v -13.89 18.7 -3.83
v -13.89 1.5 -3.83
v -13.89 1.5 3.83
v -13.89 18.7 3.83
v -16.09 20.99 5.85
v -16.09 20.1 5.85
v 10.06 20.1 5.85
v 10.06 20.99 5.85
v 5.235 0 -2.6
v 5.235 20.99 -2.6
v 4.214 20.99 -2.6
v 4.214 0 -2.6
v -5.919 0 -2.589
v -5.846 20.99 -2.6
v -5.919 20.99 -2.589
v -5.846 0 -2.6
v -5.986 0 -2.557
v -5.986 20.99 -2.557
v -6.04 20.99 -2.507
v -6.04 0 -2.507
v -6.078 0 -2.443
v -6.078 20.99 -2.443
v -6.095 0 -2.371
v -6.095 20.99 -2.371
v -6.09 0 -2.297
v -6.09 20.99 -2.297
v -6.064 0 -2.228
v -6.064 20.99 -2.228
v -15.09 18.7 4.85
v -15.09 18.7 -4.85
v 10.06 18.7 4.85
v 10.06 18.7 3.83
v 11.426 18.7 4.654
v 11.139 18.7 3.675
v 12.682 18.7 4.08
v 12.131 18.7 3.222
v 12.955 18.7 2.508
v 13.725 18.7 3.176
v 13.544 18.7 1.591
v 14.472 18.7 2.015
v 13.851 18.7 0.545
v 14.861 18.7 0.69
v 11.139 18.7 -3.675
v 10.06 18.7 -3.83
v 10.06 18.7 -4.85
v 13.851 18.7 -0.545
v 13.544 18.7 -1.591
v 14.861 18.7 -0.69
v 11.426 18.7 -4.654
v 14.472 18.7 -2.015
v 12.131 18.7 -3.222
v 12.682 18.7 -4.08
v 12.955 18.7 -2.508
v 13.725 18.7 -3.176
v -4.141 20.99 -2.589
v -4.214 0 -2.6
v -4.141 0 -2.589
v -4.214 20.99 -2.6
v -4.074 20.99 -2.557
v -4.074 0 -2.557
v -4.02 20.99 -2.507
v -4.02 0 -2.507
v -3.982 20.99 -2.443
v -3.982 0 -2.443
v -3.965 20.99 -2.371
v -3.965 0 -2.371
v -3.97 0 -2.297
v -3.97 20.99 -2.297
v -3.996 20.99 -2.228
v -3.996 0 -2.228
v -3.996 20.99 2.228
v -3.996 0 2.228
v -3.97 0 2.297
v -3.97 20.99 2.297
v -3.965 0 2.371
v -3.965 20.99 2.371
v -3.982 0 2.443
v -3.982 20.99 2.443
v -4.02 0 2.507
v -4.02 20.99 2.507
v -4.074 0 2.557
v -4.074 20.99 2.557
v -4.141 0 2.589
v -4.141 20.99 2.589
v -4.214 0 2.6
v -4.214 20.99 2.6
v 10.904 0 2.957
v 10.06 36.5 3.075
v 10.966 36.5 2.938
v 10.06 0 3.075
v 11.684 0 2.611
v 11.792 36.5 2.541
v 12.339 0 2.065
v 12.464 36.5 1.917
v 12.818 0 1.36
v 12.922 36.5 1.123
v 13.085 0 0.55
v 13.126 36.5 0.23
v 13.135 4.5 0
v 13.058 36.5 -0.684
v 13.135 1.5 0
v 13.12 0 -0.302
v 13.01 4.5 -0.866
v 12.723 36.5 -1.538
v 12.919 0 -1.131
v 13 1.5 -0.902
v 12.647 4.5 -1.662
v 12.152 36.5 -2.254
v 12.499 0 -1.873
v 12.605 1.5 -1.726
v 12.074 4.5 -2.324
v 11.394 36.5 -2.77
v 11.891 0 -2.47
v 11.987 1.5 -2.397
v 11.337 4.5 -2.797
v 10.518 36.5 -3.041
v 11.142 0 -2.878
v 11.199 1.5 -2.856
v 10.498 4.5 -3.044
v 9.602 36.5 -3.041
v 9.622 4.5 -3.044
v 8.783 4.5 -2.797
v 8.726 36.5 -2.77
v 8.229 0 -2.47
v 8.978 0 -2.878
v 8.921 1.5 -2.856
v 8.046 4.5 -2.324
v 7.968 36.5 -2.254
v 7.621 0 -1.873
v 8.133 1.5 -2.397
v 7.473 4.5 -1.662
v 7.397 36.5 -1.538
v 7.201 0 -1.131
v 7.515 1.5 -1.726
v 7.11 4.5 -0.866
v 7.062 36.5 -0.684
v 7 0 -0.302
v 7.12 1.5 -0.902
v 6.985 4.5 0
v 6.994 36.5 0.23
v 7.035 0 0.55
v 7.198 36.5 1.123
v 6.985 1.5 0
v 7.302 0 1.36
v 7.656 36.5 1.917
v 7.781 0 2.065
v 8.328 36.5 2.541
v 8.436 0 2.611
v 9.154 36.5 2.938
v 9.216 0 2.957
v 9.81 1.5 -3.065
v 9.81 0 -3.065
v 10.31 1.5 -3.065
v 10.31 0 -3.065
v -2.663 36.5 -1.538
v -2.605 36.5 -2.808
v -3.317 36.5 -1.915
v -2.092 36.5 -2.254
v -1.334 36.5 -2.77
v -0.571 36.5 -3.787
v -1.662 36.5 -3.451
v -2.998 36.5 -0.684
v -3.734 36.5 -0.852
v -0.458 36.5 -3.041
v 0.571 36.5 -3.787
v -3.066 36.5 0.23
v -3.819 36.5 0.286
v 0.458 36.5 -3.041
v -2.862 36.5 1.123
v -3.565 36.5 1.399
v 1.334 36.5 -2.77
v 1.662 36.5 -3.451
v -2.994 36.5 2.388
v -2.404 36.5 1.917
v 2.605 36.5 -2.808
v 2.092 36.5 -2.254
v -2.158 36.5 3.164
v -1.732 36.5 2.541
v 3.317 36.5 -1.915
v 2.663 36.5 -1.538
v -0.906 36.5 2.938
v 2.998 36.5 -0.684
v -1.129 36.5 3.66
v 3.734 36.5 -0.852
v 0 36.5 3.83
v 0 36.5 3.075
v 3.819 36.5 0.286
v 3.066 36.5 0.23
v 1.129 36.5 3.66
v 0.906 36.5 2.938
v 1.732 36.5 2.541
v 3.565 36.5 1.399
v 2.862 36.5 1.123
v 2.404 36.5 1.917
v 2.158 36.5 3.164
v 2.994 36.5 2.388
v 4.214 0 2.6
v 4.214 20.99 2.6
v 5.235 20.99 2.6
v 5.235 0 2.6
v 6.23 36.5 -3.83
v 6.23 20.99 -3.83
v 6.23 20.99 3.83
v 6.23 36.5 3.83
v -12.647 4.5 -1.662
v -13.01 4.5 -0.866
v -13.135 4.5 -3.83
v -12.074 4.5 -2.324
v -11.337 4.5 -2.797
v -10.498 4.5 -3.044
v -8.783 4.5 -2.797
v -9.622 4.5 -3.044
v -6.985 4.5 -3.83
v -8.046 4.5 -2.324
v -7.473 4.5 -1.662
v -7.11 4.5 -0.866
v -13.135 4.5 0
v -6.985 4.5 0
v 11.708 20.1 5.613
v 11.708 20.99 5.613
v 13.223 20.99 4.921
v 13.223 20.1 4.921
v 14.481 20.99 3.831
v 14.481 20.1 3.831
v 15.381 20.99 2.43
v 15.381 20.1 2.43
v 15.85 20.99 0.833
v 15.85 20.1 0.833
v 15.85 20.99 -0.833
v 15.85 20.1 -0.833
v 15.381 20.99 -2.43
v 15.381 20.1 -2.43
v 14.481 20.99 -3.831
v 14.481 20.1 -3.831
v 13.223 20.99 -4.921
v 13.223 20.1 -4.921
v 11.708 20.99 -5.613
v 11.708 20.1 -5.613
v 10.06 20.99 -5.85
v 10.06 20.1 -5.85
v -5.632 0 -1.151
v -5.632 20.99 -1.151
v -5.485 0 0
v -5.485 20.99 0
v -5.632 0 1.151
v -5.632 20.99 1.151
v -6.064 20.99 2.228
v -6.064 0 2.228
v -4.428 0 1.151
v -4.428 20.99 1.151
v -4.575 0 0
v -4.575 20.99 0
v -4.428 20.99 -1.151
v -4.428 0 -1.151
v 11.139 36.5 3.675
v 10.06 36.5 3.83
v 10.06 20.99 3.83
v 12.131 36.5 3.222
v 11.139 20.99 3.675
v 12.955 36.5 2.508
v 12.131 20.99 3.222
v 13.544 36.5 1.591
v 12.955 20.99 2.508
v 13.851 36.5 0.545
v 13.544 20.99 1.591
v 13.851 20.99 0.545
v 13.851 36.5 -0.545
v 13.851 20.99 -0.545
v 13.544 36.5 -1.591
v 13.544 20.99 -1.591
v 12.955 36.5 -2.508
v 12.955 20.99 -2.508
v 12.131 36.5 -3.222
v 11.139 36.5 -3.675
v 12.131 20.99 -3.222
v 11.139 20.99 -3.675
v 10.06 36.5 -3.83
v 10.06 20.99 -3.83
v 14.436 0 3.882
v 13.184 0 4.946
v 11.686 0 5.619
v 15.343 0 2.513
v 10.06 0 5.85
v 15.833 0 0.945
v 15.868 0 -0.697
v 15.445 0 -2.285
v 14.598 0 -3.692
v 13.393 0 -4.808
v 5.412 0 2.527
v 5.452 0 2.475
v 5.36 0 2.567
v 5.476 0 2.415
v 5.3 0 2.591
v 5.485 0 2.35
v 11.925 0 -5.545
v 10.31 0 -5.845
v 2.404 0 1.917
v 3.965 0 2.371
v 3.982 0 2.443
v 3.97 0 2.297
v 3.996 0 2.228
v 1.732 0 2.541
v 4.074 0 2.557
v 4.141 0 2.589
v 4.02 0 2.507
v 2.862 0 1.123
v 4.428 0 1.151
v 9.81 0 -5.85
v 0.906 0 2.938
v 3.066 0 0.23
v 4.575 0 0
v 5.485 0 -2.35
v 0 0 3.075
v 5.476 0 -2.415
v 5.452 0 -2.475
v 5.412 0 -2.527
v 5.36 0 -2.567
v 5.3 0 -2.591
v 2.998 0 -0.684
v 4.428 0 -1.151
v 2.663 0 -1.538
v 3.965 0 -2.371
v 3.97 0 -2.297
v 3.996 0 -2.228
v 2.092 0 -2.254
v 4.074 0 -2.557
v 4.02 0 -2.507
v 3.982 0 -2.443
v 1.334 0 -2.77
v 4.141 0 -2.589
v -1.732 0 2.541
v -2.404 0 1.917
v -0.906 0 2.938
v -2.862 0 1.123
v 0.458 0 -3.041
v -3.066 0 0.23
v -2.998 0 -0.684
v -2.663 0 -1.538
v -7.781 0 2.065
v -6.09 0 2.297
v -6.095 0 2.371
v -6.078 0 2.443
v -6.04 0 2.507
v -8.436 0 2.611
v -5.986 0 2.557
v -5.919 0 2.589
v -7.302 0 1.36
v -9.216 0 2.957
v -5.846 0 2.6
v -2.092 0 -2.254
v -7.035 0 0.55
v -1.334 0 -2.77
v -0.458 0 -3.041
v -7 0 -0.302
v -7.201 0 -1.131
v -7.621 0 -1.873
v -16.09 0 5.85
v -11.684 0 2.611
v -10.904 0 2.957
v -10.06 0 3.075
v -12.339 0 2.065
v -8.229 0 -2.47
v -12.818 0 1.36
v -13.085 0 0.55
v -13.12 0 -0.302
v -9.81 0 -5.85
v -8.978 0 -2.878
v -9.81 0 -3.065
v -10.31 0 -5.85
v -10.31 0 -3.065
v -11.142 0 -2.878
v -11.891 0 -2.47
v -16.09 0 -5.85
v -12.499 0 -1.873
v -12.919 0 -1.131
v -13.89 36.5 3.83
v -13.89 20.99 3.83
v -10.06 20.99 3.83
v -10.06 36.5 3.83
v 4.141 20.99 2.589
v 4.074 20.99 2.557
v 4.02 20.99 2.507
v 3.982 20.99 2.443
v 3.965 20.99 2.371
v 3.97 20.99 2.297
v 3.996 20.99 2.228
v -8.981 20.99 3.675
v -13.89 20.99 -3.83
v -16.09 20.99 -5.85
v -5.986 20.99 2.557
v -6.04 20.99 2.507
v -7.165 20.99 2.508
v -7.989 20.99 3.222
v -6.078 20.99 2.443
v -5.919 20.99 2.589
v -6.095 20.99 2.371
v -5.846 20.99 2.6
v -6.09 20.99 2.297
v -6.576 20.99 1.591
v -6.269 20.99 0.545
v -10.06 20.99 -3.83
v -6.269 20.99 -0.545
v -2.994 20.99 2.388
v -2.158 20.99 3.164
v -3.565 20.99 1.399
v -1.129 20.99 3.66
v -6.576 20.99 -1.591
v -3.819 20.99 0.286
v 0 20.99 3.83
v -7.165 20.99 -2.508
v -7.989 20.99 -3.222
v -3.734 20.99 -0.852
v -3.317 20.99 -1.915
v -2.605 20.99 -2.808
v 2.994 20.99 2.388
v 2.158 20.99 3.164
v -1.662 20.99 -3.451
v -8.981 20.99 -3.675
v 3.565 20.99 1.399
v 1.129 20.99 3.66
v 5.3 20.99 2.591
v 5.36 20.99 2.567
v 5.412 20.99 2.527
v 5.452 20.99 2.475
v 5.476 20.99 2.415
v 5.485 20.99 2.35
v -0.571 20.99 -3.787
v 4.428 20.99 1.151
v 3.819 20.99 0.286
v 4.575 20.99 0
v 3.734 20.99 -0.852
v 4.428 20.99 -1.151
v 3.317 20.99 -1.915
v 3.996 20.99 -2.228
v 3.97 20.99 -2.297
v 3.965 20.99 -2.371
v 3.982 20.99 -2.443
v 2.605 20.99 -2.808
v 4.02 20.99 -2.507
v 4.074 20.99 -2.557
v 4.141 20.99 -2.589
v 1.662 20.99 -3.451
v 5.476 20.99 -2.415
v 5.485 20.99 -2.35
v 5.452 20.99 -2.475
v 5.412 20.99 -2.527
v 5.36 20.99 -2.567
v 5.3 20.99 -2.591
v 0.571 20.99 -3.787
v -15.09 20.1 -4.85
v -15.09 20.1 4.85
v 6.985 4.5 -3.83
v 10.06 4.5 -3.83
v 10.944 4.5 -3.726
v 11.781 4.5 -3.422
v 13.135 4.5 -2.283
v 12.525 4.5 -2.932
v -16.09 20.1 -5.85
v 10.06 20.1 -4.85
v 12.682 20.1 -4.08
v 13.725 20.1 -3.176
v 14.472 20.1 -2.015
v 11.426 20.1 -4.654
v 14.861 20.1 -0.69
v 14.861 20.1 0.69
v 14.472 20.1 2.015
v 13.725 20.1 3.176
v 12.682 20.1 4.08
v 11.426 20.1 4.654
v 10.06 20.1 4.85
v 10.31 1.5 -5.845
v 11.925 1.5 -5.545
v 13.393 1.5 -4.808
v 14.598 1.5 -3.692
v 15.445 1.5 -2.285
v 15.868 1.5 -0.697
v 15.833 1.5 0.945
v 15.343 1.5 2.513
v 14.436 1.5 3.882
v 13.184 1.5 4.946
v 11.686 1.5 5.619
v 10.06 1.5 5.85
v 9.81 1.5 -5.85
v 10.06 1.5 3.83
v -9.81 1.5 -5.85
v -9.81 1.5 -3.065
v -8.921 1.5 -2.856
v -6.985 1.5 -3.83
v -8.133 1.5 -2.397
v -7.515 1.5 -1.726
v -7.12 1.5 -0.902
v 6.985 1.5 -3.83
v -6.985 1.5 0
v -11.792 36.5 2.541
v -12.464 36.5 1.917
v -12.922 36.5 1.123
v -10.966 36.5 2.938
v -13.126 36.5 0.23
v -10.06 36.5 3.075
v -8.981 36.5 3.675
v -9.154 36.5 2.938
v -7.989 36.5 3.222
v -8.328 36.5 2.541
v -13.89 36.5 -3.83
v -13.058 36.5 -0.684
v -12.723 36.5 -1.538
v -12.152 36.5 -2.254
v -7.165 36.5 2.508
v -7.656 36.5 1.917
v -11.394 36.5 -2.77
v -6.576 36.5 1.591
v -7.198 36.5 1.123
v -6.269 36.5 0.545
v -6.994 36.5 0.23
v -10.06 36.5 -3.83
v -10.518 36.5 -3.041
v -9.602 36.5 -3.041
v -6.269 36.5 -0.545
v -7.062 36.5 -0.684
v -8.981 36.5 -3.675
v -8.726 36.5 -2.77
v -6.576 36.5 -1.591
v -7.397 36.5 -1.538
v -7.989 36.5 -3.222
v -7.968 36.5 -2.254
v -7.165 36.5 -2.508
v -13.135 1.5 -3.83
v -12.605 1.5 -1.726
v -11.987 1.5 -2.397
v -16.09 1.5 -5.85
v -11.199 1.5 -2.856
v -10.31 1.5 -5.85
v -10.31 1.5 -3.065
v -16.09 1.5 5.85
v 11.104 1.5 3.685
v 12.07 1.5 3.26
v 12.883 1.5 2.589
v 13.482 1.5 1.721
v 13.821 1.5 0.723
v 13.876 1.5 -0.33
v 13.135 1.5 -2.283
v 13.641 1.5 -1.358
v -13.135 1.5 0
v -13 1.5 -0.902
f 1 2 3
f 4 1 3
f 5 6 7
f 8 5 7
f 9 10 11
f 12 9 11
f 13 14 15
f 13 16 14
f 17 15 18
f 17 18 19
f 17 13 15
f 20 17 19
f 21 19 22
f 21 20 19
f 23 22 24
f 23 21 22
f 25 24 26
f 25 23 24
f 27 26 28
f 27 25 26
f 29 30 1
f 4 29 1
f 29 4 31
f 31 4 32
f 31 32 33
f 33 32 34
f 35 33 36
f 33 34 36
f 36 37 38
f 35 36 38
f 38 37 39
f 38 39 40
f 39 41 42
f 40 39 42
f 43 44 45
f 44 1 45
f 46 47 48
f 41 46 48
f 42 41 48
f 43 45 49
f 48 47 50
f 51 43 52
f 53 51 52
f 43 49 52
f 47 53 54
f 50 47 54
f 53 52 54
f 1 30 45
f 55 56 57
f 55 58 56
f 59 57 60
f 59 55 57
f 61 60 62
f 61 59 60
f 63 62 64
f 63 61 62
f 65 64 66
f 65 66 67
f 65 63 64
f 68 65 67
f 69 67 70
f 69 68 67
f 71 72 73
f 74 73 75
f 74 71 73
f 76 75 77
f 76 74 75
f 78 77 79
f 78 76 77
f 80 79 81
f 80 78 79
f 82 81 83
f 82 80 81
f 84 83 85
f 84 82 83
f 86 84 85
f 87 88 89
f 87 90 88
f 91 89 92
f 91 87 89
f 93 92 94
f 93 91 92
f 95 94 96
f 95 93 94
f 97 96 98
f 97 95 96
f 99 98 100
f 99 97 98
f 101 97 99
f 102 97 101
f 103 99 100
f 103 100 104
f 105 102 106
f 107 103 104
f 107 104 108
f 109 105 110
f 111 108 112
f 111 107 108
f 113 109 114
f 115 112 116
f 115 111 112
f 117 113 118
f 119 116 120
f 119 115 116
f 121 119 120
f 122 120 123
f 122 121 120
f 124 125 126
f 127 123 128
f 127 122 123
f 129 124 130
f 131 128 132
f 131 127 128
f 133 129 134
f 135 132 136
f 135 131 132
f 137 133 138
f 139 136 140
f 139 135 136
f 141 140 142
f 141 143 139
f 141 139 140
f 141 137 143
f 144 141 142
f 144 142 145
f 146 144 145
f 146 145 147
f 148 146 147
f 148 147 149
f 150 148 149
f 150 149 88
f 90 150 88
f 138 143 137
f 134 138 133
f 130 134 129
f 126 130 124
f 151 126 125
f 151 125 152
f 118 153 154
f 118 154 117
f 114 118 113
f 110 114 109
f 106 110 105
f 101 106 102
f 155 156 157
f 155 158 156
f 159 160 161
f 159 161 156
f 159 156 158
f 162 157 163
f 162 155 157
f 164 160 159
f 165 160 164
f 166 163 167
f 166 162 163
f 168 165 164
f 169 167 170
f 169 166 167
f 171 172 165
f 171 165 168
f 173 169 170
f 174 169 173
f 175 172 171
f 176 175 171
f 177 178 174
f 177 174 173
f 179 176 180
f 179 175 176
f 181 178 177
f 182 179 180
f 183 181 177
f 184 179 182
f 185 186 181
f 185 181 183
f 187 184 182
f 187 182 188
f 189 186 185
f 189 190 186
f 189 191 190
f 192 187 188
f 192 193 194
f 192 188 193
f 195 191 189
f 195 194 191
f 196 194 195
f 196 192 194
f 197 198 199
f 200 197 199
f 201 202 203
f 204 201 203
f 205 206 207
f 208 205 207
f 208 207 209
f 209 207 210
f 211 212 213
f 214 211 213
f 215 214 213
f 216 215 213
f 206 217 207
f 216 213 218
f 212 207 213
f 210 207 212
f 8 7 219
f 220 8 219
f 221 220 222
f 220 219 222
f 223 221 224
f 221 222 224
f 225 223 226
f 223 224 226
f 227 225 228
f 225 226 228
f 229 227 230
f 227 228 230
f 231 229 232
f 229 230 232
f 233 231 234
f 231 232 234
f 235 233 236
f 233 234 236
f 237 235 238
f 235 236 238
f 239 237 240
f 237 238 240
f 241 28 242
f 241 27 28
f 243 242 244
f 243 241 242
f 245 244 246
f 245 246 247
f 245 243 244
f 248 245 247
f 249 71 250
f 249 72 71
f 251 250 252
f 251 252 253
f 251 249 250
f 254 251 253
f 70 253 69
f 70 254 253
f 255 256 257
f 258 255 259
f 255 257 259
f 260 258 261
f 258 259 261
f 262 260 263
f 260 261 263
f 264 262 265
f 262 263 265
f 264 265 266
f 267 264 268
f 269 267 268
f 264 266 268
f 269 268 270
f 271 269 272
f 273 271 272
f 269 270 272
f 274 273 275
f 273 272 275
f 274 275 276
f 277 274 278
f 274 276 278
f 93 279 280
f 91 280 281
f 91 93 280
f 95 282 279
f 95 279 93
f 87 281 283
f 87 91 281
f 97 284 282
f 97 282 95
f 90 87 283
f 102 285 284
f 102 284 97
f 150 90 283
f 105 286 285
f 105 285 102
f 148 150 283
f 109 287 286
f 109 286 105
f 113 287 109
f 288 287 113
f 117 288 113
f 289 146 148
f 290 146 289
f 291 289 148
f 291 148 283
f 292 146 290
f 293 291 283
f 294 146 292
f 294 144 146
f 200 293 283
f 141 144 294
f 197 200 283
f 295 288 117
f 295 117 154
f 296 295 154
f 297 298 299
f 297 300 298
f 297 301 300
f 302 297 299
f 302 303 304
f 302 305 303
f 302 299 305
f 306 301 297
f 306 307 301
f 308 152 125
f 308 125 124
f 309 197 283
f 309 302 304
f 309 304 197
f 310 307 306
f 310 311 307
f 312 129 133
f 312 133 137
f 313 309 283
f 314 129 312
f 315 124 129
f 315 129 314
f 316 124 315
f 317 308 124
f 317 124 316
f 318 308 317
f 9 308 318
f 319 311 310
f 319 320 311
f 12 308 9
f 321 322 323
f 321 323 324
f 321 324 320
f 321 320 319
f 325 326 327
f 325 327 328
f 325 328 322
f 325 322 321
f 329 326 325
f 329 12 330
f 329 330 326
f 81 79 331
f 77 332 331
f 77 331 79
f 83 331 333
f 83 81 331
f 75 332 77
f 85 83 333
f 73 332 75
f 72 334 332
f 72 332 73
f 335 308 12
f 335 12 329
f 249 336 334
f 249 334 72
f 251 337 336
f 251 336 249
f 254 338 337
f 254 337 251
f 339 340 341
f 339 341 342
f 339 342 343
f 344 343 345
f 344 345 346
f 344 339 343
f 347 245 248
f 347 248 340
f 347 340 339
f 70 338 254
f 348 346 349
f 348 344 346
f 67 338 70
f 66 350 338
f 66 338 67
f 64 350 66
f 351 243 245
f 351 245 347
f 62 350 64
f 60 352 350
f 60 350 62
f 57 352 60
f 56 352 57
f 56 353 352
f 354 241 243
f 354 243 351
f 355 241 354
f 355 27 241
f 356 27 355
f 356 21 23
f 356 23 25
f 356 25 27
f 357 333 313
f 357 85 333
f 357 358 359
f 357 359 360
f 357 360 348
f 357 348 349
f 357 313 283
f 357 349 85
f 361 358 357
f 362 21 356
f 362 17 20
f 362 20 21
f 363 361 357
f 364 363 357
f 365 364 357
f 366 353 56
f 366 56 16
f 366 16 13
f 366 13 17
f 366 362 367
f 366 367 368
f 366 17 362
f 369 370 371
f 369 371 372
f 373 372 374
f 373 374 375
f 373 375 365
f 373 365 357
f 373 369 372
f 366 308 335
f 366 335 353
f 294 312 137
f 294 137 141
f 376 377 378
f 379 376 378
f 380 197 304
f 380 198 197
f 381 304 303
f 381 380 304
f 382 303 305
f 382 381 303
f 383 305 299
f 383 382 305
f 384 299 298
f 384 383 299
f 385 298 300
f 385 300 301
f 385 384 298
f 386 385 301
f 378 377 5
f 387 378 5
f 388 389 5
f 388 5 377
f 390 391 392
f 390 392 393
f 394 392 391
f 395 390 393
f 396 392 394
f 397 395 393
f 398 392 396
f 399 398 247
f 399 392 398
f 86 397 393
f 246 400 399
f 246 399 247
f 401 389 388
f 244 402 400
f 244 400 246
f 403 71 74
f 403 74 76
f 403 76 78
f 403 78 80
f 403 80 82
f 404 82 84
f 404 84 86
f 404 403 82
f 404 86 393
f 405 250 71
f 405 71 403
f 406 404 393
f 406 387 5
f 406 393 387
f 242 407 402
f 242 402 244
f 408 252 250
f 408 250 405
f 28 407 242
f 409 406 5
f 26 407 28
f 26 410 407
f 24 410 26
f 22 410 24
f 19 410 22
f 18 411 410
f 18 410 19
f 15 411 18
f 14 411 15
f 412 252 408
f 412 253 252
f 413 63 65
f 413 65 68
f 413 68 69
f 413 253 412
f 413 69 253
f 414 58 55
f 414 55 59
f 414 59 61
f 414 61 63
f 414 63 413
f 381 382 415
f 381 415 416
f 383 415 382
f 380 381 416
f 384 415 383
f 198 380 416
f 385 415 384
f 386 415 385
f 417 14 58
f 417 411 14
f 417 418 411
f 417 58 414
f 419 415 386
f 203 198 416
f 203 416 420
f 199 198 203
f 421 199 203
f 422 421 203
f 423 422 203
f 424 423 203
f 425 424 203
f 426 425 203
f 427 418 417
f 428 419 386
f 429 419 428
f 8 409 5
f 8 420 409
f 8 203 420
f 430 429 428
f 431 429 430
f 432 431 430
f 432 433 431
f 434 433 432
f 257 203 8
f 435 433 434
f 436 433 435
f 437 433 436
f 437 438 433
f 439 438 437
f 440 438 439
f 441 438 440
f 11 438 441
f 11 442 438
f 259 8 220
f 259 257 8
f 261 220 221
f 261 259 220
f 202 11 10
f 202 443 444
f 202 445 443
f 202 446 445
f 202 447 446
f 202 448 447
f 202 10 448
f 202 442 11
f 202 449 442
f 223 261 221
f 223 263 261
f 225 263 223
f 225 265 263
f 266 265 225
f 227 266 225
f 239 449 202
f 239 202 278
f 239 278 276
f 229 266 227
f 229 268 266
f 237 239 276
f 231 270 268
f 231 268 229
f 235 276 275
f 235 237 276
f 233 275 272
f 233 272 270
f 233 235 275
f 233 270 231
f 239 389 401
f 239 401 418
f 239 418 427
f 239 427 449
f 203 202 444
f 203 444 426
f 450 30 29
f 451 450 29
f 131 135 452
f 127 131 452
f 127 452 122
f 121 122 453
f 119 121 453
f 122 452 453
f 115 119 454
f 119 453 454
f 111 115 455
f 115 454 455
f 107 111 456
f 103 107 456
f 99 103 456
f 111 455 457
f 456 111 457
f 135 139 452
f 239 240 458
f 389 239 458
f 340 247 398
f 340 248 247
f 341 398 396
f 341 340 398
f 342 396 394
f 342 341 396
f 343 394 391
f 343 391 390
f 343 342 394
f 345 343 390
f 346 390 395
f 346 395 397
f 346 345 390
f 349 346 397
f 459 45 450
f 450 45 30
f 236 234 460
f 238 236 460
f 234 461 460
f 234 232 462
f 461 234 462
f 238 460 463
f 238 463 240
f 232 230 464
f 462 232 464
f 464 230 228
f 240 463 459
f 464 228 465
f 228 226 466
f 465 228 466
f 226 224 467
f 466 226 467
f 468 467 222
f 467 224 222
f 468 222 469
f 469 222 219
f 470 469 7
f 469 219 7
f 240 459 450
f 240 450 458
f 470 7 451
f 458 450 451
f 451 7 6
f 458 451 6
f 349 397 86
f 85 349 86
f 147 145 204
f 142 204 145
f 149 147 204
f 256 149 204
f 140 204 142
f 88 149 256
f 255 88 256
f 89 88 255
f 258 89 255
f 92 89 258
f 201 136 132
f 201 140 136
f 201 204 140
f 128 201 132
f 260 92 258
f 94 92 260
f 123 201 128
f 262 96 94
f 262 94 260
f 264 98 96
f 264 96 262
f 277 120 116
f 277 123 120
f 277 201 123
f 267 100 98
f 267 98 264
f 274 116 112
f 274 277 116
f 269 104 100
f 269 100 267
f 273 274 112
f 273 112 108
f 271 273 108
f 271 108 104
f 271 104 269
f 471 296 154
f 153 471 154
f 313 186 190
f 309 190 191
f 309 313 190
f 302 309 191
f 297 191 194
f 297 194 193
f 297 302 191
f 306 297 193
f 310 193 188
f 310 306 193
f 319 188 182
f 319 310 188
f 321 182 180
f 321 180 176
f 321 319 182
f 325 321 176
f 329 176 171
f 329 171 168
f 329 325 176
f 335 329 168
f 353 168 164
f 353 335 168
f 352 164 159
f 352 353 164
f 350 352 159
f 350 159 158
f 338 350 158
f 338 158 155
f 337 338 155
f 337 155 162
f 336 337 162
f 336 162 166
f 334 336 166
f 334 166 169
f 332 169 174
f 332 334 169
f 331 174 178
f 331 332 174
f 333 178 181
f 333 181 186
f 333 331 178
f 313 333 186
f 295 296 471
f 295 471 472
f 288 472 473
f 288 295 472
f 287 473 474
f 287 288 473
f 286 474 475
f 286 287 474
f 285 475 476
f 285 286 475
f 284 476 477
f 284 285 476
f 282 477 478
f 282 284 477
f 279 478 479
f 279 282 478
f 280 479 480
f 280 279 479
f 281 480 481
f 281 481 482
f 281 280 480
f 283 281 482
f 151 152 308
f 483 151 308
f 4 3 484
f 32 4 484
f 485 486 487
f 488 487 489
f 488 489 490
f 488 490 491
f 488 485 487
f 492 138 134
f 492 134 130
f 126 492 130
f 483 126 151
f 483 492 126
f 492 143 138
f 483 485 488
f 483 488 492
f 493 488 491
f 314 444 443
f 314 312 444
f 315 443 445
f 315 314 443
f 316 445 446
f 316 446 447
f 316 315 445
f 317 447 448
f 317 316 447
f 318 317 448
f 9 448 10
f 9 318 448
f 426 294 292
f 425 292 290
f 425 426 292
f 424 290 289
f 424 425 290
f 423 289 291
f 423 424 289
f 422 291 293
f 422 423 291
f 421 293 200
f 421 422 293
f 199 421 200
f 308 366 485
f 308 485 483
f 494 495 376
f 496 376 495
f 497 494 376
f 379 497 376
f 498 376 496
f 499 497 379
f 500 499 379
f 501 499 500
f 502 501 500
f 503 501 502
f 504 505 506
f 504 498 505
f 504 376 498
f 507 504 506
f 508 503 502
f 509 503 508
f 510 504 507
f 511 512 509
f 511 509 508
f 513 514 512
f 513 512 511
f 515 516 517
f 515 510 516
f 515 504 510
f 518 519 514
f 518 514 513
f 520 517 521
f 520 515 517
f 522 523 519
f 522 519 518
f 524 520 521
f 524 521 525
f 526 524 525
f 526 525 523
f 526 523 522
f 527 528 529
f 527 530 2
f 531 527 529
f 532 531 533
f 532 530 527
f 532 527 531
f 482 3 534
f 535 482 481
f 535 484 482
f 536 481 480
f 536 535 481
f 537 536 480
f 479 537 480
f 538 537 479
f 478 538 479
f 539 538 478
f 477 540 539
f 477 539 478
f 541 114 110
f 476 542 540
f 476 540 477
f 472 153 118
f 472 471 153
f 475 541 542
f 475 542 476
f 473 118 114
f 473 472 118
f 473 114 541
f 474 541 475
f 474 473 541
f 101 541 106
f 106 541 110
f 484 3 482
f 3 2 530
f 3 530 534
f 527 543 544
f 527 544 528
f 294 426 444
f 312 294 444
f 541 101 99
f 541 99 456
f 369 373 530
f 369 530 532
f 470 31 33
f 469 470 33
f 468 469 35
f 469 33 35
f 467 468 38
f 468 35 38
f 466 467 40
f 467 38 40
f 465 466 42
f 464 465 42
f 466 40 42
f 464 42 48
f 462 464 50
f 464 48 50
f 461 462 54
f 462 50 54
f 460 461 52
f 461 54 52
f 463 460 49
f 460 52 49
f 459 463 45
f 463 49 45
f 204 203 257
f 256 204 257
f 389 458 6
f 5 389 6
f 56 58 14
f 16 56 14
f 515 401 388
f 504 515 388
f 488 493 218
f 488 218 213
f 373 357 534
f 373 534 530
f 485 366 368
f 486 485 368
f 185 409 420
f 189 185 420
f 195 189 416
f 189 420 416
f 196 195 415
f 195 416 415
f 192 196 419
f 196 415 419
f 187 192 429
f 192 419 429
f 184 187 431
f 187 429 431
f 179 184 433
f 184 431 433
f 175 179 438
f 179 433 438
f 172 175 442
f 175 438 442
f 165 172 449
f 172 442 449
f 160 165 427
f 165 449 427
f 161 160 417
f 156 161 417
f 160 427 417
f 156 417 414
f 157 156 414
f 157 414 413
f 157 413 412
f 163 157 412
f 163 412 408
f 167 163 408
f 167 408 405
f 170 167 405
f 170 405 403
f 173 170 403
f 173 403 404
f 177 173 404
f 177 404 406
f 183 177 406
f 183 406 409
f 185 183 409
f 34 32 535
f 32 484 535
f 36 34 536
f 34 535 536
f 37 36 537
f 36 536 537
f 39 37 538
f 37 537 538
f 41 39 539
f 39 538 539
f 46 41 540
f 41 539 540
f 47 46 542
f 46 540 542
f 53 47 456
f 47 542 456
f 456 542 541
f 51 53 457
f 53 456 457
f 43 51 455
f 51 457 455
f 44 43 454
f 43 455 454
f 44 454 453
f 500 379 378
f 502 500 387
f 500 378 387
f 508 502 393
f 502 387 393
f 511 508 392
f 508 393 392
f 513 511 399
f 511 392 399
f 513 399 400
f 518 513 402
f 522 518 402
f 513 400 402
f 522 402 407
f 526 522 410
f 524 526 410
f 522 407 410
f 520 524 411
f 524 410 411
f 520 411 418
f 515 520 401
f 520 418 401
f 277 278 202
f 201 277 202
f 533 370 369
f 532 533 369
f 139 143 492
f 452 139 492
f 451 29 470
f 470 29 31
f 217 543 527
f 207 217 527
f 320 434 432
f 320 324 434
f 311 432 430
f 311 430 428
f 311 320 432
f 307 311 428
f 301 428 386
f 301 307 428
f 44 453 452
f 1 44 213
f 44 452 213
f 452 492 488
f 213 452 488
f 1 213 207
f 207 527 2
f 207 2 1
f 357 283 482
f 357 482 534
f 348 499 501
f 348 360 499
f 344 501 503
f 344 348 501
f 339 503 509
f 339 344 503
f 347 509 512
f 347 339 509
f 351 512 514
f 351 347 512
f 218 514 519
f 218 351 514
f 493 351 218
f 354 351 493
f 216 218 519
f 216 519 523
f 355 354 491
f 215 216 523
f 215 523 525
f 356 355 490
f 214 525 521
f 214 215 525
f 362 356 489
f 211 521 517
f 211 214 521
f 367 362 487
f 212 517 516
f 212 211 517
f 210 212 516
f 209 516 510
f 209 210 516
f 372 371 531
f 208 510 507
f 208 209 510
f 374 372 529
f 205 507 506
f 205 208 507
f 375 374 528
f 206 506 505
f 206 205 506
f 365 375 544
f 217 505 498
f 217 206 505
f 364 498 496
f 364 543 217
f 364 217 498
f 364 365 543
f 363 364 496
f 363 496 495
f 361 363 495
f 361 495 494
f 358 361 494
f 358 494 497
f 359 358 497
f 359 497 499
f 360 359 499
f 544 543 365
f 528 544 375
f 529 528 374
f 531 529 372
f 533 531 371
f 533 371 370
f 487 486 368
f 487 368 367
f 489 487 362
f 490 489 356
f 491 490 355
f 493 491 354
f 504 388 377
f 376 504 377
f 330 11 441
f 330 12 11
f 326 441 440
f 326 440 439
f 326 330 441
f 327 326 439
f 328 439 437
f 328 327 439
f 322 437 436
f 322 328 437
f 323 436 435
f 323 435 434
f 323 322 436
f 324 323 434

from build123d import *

# Parameters (mm, degrees)
SKETCH1_R               = 3.83
SKETCH1_R_2             = 3.075
BOSS_EXTRUDE1_DEPTH     = 36.5
BOSS_EXTRUDE1_2_DEPTH   = 36.5
BOSS_EXTRUDE1_3_DEPTH   = 36.5
SKETCH2_R               = 3.075
BOSS_EXTRUDE2_DEPTH     = 1.5
SKETCH3_R               = 3.075
BOSS_EXTRUDE3_DEPTH     = 17.2
SKETCH4_R               = 3.075
BOSS_EXTRUDE4_DEPTH     = 2.29
CUT_EXTRUDE1_DEPTH      = 1.4
FILLET1_R               = 0.25
CUT_EXTRUDE_THIN2_DEPTH = 1.6
SKETCH7_W               = 6.15
SKETCH7_H               = 8.738173166
SKETCH7_H_2             = 8.358950775
CUT_EXTRUDE2_DEPTH      = 3


with BuildPart() as part:
    # Sketch1 → Boss-Extrude1 (new body)
    with BuildSketch(Plane(origin=(0, 0, 0), x_dir=(1, 0, 0), z_dir=(0, 1, 0))):
        with Locations(Location((0, 0, 0), (0, 0, 270))):
            Circle(SKETCH1_R)
        with Locations(Location((0, 0, 0), (0, 0, 270))):
            Circle(SKETCH1_R_2, mode=Mode.SUBTRACT)
    extrude(amount=BOSS_EXTRUDE1_DEPTH)



with BuildPart() as body_2:
    # Sketch1 → Boss-Extrude1 2 (new body)
    with BuildSketch(Plane(origin=(0, 0, 0), x_dir=(1, 0, 0), z_dir=(0, 1, 0))):
        with BuildLine():
            Line((-10.06, 3.83), (-13.89, 3.83))
            Line((-13.89, 3.83), (-13.89, -3.83))
            Line((-13.89, -3.83), (-10.06, -3.83))
            ThreePointArc((-10.06, -3.83), (-6.23, 0), (-10.06, 3.83))
        make_face()
        with Locations(Location((-10.06, 0, 0), (0, 0, 270))):
            Circle(SKETCH1_R_2, mode=Mode.SUBTRACT)
    extrude(amount=BOSS_EXTRUDE1_2_DEPTH)


with BuildPart() as body_3:
    # Sketch1 → Boss-Extrude1 3 (new body)
    with BuildSketch(Plane(origin=(0, 0, 0), x_dir=(1, 0, 0), z_dir=(0, 1, 0))):
        with BuildLine():
            Line((10.06, 3.83), (6.23, 3.83))
            Line((6.23, 3.83), (6.23, -3.83))
            Line((6.23, -3.83), (10.06, -3.83))
            ThreePointArc((10.06, -3.83), (13.89, 0), (10.06, 3.83))
        make_face()
        with Locations(Location((10.06, 0, 0), (0, 0, 270))):
            Circle(SKETCH1_R_2, mode=Mode.SUBTRACT)
    extrude(amount=BOSS_EXTRUDE1_3_DEPTH)


with BuildPart() as part_1:
    add(part.part)

    add(body_2.part)  # Boss-Extrude2 merges body 2

    add(body_3.part)  # Boss-Extrude2 merges body 3
    # Sketch2 → Boss-Extrude2 (add)
    with BuildSketch(Plane(origin=(0, 0, 0), x_dir=(1, 0, 0), z_dir=(0, 1, 0))):
        with BuildLine():
            Line((-10.06, 5.85), (10.06, 5.85))
            ThreePointArc((10.06, 5.85), (15.91, 0), (10.06, -5.85))
            Line((10.06, -5.85), (-10.06, -5.85))
            Line((-10.06, -5.85), (-16.09, -5.85))
            Line((-16.09, -5.85), (-16.09, 5.85))
            Line((-16.09, 5.85), (-10.06, 5.85))
        make_face()
        with Locations(Location((-10.06, 0, 0), (0, 0, 270))):
            Circle(SKETCH2_R, mode=Mode.SUBTRACT)
        with Locations(Location((0, 0, 0), (0, 0, 270))):
            Circle(SKETCH2_R, mode=Mode.SUBTRACT)
        with Locations(Location((10.06, 0, 0), (0, 0, 270))):
            Circle(SKETCH2_R, mode=Mode.SUBTRACT)
        with BuildLine():
            Line((5.485, -2.6), (5.485, 2.6))
            Line((5.485, 2.6), (3.764389061, 2.6))
            ThreePointArc((3.764389061, 2.6), (4.575, 0), (3.764389061, -2.6))
            Line((3.764389061, -2.6), (5.485, -2.6))
        make_face(mode=Mode.SUBTRACT)
        with BuildLine():
            Line((-3.764389061, 2.6), (-6.295610939, 2.6))
            ThreePointArc((-6.295610939, 2.6), (-5.485, 0), (-6.295610939, -2.6))
            Line((-6.295610939, -2.6), (-3.764389061, -2.6))
            ThreePointArc((-3.764389061, -2.6), (-4.575, 0), (-3.764389061, 2.6))
        make_face(mode=Mode.SUBTRACT)
    extrude(amount=BOSS_EXTRUDE2_DEPTH)

    # Sketch3 → Boss-Extrude3 (add)
    with BuildSketch(Plane(origin=(0, 1.5, 0), x_dir=(1, 0, 0), z_dir=(0, 1, 0))):
        with BuildLine():
            Line((-1.387862692, -3.83), (-13.89, -3.83))
            Line((-13.89, -3.83), (-13.89, 3.83))
            Line((-13.89, 3.83), (-3.321031177, 3.83))
            Line((-3.321031177, 3.83), (10.06, 3.83))
            ThreePointArc((10.06, 3.83), (13.89, 0), (10.06, -3.83))
            Line((10.06, -3.83), (-1.387862692, -3.83))
        make_face()
        with Locations(Location((-10.06, 0, 0), (0, 0, 270))):
            Circle(SKETCH3_R, mode=Mode.SUBTRACT)
        with Locations(Location((0, 0, 0), (0, 0, 270))):
            Circle(SKETCH3_R, mode=Mode.SUBTRACT)
        with Locations(Location((10.06, 0, 0), (0, 0, 270))):
            Circle(SKETCH3_R, mode=Mode.SUBTRACT)
        with BuildLine():
            Line((-3.764389061, 2.6), (-6.295610939, 2.6))
            ThreePointArc((-6.295610939, 2.6), (-5.485, 0), (-6.295610939, -2.6))
            Line((-6.295610939, -2.6), (-3.764389061, -2.6))
            ThreePointArc((-3.764389061, -2.6), (-4.575, 0), (-3.764389061, 2.6))
        make_face(mode=Mode.SUBTRACT)
        with BuildLine():
            Line((5.485, -2.6), (5.485, 2.6))
            Line((5.485, 2.6), (3.764389061, 2.6))
            ThreePointArc((3.764389061, 2.6), (4.575, 0), (3.764389061, -2.6))
            Line((3.764389061, -2.6), (5.485, -2.6))
        make_face(mode=Mode.SUBTRACT)
    extrude(amount=BOSS_EXTRUDE3_DEPTH)

    # Sketch4 → Boss-Extrude4 (add)
    with BuildSketch(Plane(origin=(0, 18.7, 0), x_dir=(1, 0, 0), z_dir=(0, 1, 0))):
        with BuildLine():
            Line((10.06, 5.85), (-10.06, 5.85))
            Line((-10.06, 5.85), (-16.09, 5.85))
            Line((-16.09, 5.85), (-16.09, -5.85))
            Line((-16.09, -5.85), (-10.06, -5.85))
            Line((-10.06, -5.85), (10.06, -5.85))
            ThreePointArc((10.06, -5.85), (15.91, 0), (10.06, 5.85))
        make_face()
        with Locations(Location((-10.06, 0, 0), (0, 0, 270))):
            Circle(SKETCH4_R, mode=Mode.SUBTRACT)
        with Locations(Location((10.06, 0, 0), (0, 0, 270))):
            Circle(SKETCH4_R, mode=Mode.SUBTRACT)
        with Locations(Location((0, 0, 0), (0, 0, 270))):
            Circle(SKETCH4_R, mode=Mode.SUBTRACT)
        with BuildLine():
            Line((-3.764389061, 2.6), (-6.295610939, 2.6))
            ThreePointArc((-6.295610939, 2.6), (-5.485, 0), (-6.295610939, -2.6))
            Line((-6.295610939, -2.6), (-3.764389061, -2.6))
            ThreePointArc((-3.764389061, -2.6), (-4.575, 0), (-3.764389061, 2.6))
        make_face(mode=Mode.SUBTRACT)
        with BuildLine():
            Line((5.485, -2.6), (5.485, 2.6))
            Line((5.485, 2.6), (3.764389061, 2.6))
            ThreePointArc((3.764389061, 2.6), (4.575, 0), (3.764389061, -2.6))
            Line((3.764389061, -2.6), (5.485, -2.6))
        make_face(mode=Mode.SUBTRACT)
    extrude(amount=BOSS_EXTRUDE4_DEPTH)

    # Sketch5 → Cut-Extrude1 (cut)
    with BuildSketch(Plane.XZ.offset(-18.7)):
        with BuildLine():
            Line((-16.09, 5.85), (10.06, 5.85))
            ThreePointArc((10.06, 5.85), (15.91, 0), (10.06, -5.85))
            Line((10.06, -5.85), (-16.09, -5.85))
            Line((-16.09, -5.85), (-16.09, 5.85))
        make_face()
        with BuildLine():
            Line((-15.09, 4.85), (10.06, 4.85))
            ThreePointArc((10.06, 4.85), (14.91, 0), (10.06, -4.85))
            Line((10.06, -4.85), (-15.09, -4.85))
            Line((-15.09, -4.85), (-15.09, 4.85))
        make_face(mode=Mode.SUBTRACT)
    extrude(amount=-CUT_EXTRUDE1_DEPTH, mode=Mode.SUBTRACT)

    # Fillet1
    fillet1_edges = [part_1.edges().sort_by_distance(p)[0] for p in [
        (-3.764389061, 10.495, -2.6),
        (-6.295610939, 10.495, -2.6),
        (-6.295610939, 10.495, 2.6),
        (-3.764389061, 10.495, 2.6),
        (5.485, 10.495, 2.6),
        (5.485, 10.495, -2.6),
        (3.764389061, 10.495, -2.6),
        (3.764389061, 10.495, 2.6),
    ]]
    fillet(fillet1_edges, radius=FILLET1_R)

    # Sketch6 → Cut-Extrude-Thin2 (cut)
    with BuildSketch(Plane.XZ):
        Polygon((-10.31, 0), (-10.31, -6.991466743), (10.31, -7.436536546), (10.31, 0), (9.81, 0), (9.81, -6.925627901), (-9.81, -6.502142473), (-9.81, 0), align=None)
    extrude(amount=-CUT_EXTRUDE_THIN2_DEPTH, mode=Mode.SUBTRACT)

    # Sketch7 → Cut-Extrude2 (cut)
    with BuildSketch(Plane(origin=(0, 1.5, 0), x_dir=(1, 0, 0), z_dir=(0, 1, 0))):
        with Locations((-10.06, 4.369086583)):
            Rectangle(SKETCH7_W, SKETCH7_H)
        with Locations((10.06, 4.179475388)):
            Rectangle(SKETCH7_W, SKETCH7_H_2)
    extrude(amount=CUT_EXTRUDE2_DEPTH, mode=Mode.SUBTRACT)


solid = part_1.part
